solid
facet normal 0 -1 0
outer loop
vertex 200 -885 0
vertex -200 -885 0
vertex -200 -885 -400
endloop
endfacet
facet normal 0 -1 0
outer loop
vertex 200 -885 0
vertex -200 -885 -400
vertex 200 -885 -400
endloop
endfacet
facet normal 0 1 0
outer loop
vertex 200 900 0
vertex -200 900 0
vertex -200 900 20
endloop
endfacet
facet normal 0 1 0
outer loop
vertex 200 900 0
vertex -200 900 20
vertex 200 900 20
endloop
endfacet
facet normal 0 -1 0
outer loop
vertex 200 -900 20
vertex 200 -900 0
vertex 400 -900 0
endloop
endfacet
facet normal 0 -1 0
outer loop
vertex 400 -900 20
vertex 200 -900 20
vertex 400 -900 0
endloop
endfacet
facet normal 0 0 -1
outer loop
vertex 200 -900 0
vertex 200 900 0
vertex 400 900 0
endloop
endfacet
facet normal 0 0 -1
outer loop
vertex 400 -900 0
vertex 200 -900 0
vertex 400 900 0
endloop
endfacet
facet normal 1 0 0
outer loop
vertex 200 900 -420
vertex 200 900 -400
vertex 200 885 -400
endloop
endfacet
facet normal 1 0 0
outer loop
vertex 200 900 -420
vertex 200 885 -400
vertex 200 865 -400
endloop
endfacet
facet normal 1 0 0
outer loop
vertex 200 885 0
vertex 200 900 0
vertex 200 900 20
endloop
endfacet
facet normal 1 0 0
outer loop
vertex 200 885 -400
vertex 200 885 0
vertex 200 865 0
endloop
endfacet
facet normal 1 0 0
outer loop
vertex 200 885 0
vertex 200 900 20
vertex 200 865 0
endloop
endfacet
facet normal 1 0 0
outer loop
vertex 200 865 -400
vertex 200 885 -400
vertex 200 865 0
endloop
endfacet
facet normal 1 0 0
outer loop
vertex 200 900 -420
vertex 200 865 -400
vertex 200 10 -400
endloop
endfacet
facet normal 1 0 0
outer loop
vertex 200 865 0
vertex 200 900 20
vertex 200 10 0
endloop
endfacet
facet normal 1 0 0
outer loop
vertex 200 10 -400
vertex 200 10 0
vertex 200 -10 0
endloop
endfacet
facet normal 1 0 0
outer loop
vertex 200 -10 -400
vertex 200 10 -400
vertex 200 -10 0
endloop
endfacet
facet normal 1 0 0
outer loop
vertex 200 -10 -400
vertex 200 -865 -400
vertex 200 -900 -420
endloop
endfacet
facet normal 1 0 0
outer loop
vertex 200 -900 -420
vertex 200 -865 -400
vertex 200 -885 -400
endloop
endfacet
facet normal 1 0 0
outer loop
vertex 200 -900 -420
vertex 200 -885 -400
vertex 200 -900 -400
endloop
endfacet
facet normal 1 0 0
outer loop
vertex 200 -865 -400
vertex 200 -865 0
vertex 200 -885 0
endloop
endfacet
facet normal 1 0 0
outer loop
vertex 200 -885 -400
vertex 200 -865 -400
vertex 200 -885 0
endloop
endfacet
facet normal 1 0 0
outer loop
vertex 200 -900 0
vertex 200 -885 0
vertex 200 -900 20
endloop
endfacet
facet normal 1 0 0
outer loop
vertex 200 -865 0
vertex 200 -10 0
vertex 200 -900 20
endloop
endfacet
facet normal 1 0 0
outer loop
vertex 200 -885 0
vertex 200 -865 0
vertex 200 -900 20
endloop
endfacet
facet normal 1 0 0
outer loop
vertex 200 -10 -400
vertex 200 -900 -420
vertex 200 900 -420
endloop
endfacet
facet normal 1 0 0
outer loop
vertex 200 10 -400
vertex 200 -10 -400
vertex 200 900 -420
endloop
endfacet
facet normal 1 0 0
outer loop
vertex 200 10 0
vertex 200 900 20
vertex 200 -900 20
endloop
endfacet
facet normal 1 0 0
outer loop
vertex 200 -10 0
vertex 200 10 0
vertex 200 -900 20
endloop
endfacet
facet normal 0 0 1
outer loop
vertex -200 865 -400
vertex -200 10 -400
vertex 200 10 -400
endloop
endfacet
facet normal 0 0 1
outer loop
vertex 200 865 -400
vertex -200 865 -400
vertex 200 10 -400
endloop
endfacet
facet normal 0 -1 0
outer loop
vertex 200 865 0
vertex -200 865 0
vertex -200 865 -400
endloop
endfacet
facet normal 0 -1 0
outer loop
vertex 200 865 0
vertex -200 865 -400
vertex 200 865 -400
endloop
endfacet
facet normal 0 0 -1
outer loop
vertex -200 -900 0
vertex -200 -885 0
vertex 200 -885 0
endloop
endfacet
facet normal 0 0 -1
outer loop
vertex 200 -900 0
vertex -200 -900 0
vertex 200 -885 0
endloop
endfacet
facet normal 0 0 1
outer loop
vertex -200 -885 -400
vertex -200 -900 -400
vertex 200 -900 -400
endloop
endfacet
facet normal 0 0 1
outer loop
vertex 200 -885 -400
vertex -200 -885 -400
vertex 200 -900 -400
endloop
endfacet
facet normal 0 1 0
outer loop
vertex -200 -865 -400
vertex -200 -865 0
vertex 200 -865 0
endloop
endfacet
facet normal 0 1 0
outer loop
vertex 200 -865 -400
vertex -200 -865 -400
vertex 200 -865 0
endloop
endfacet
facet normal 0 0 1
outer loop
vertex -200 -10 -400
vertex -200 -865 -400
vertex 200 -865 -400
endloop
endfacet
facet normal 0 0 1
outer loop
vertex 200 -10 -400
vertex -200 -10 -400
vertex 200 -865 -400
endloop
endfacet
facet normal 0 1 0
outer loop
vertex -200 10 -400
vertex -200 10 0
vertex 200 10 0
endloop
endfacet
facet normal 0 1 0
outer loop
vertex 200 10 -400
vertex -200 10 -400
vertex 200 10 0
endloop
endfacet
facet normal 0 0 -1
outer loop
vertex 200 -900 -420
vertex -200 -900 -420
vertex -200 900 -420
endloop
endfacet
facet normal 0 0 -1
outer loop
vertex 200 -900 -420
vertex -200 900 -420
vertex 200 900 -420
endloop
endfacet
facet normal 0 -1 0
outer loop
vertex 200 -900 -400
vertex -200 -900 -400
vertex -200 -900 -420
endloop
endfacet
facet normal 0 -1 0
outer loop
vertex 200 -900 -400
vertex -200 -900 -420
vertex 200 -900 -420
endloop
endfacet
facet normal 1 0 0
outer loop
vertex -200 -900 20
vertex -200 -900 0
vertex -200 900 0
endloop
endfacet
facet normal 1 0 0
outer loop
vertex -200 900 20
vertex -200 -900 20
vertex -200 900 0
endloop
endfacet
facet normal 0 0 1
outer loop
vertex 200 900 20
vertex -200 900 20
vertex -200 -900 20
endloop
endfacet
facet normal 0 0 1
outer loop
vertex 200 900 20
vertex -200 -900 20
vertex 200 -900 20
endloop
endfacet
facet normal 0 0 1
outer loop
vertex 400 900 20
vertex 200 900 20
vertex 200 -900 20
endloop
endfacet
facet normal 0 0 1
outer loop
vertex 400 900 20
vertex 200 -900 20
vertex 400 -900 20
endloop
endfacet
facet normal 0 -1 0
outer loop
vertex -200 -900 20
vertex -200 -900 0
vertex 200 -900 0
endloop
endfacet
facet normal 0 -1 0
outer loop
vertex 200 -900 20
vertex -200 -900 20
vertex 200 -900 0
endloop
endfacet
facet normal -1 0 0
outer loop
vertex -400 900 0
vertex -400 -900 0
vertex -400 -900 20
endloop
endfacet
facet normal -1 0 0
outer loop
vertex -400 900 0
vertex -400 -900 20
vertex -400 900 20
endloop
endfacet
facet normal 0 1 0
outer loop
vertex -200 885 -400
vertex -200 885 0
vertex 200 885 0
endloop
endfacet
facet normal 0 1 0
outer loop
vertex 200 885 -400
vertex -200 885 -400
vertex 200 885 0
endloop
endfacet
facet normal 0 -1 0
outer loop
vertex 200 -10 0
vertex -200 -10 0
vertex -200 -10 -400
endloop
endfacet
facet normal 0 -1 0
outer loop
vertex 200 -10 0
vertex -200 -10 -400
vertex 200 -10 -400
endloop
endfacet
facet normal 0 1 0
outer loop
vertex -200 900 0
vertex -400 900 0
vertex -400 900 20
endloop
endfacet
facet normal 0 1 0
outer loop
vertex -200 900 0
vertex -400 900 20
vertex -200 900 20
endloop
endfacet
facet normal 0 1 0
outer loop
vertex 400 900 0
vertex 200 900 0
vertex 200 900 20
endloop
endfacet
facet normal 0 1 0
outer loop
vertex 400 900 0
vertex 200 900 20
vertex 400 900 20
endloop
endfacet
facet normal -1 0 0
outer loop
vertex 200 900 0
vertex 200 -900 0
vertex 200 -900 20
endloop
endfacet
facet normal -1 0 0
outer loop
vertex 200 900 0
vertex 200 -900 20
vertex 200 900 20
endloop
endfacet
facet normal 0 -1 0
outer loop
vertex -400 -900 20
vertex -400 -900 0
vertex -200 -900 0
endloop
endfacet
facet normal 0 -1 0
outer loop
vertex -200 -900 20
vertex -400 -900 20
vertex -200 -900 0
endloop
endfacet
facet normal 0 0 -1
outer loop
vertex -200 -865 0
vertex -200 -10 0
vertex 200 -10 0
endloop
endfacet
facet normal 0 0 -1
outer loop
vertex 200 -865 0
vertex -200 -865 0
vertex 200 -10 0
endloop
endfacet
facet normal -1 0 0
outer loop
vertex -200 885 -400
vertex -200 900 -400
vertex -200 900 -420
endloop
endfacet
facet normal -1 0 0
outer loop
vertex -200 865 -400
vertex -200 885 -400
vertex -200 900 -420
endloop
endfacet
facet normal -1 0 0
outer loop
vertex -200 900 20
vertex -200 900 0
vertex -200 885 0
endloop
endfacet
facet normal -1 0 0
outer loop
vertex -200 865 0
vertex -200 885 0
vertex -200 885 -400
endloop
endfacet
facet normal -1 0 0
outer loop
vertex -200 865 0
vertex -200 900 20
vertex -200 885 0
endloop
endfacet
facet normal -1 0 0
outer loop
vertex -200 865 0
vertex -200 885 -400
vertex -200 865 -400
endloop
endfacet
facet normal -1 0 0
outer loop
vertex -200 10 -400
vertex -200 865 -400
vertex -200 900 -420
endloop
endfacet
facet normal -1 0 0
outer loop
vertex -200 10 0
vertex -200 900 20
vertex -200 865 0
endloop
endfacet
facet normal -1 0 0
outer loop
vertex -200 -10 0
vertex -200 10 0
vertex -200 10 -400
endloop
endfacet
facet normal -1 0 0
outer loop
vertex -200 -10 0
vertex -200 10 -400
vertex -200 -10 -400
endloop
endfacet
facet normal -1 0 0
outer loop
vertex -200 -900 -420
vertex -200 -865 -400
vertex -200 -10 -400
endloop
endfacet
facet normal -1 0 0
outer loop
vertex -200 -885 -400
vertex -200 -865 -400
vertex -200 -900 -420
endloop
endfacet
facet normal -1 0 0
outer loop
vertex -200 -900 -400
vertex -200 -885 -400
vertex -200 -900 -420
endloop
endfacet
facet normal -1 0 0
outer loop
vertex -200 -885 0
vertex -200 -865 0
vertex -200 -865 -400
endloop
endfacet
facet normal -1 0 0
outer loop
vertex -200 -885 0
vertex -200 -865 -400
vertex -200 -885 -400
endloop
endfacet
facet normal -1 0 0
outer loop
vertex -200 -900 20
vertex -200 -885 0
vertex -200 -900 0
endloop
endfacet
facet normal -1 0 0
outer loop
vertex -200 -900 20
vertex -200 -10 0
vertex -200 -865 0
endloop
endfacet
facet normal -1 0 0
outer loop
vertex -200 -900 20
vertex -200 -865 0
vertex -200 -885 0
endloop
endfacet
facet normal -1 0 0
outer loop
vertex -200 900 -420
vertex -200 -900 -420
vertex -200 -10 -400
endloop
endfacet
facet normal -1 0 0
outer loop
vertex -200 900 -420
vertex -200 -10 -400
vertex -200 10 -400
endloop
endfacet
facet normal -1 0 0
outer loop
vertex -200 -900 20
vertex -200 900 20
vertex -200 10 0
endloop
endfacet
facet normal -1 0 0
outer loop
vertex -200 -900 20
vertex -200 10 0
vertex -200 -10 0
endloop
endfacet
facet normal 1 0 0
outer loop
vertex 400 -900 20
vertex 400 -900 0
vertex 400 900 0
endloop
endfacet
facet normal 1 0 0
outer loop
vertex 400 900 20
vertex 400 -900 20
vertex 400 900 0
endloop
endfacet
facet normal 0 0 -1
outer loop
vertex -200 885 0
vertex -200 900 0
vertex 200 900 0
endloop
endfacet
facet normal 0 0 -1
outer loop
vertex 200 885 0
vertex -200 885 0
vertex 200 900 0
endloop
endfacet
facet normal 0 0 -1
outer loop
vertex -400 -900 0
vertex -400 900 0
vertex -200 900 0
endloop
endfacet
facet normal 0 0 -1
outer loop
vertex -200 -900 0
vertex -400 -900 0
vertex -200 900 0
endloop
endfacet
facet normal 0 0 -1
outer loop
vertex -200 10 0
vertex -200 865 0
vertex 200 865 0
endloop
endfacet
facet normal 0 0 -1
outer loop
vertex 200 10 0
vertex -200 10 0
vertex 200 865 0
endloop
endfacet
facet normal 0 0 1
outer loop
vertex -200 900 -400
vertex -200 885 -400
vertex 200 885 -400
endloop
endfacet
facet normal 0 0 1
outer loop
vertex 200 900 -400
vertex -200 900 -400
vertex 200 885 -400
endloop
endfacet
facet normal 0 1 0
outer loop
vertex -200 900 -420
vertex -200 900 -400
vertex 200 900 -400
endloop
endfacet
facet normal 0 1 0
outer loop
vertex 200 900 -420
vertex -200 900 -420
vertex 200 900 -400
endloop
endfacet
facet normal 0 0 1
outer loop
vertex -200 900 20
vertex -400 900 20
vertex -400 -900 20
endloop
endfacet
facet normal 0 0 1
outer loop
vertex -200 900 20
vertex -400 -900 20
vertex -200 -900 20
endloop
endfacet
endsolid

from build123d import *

# Parameters (mm, degrees)
F0_W     = 400
F0_H     = 1800
F1_DEPTH = 20
F2_W     = 400
F2_H     = 20
F3_DEPTH = 400
F4_W     = 400
F4_H     = 1800
F5_DEPTH = 20
F6_W     = 200
F6_H     = 1800
F7_DEPTH = 20


with BuildPart() as f1:
    # F0 (on Top) → F1 (new body)
    with BuildSketch(Plane.XY):
        Rectangle(F0_W, F0_H)
    extrude(amount=F1_DEPTH)

    # F2 (on face) → F3 (join)
    with BuildSketch(Plane(origin=(0, 0, 0), x_dir=(1, 0, 0), z_dir=(0, 0, -1))):
        Rectangle(F2_W, F2_H)
        with Locations((0, 875)):
            Rectangle(F2_W, F2_H)
        with Locations((0, -875)):
            Rectangle(F2_W, F2_H)
    extrude(amount=F3_DEPTH)

    # F4 (on face) → F5 (join)
    with BuildSketch(Plane(origin=(0, 0, -400), x_dir=(1, 0, 0), z_dir=(0, 0, -1))):
        Rectangle(F4_W, F4_H)
    extrude(amount=F5_DEPTH)


with BuildPart() as f7:
    # F6 (on Top) → F7 (new body)
    with BuildSketch(Plane.XY):
        with Locations((-300, 0)):
            Rectangle(F6_W, F6_H)
    extrude(amount=F7_DEPTH)


with BuildPart() as f7b:
    # F6 (on Top) → F7, piece 2 (new body)
    with BuildSketch(Plane.XY):
        with Locations((300, 0)):
            Rectangle(F6_W, F6_H)
    extrude(amount=F7_DEPTH)


solid = Compound([f1.part, f7.part, f7b.part])
